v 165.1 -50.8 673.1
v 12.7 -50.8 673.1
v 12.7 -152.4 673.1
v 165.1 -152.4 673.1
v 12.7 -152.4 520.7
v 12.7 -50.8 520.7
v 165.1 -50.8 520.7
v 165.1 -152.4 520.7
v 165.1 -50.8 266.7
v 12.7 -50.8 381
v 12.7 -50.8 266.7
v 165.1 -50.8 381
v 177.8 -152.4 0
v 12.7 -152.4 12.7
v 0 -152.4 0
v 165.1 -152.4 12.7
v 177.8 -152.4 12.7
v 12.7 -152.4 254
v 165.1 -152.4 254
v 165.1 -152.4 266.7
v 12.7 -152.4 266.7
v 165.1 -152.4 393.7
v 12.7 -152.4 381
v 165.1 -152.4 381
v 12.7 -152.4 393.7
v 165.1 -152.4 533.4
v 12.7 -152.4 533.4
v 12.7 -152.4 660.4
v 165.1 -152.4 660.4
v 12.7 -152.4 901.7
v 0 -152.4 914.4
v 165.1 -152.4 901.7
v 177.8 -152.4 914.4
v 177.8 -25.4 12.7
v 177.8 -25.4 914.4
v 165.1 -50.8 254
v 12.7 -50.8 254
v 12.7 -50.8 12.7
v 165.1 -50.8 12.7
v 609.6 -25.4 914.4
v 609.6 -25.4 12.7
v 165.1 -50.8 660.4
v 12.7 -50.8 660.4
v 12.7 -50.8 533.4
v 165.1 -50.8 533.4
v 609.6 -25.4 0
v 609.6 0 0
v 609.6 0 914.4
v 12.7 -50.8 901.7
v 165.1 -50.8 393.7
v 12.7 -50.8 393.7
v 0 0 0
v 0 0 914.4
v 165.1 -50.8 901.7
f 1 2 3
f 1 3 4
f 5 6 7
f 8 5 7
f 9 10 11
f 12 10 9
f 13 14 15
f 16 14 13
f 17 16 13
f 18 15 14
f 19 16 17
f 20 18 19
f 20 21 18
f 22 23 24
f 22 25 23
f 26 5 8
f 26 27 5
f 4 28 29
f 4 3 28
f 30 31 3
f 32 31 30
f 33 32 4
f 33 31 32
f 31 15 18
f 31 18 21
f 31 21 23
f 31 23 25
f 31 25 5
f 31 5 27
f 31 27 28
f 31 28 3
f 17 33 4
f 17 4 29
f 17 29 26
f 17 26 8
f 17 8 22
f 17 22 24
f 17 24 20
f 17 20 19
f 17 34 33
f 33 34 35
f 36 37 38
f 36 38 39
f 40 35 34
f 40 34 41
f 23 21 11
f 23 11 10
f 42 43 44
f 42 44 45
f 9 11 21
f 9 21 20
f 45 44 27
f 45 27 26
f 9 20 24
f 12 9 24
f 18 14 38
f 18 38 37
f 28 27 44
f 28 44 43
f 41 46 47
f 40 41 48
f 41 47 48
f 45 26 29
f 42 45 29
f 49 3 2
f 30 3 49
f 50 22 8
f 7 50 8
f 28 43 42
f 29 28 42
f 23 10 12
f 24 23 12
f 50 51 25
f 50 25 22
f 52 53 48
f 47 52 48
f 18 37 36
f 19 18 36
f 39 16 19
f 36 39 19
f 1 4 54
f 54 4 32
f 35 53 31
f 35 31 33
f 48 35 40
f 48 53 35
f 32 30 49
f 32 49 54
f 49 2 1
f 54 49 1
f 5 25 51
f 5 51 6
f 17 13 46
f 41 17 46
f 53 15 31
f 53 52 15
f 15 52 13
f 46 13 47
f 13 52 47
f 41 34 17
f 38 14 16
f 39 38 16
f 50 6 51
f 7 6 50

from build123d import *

# Parameters (mm, degrees)
F0_W     = 609.6
F0_H     = 914.4
F1_DEPTH = 25.4
F2_W     = 177.8
F2_H     = 914.4
F3_DEPTH = 127
F4_W     = 152.4
F4_H     = 889
F5_DEPTH = 101.6
F6_W     = 152.4
F6_H     = 12.7
F7_DEPTH = 101.6
F9_DEPTH = 12.7


with BuildPart() as f1:
    # F0 (on Front) → F1 (new body)
    with BuildSketch(Plane.XZ):
        with Locations((304.8, 457.2)):
            Rectangle(F0_W, F0_H)
    extrude(amount=F1_DEPTH)

    # F2 (on face) → F3 (join)
    with BuildSketch(Plane.XZ.offset(25.4)):
        with Locations((88.9, 457.2)):
            Rectangle(F2_W, F2_H)
    extrude(amount=F3_DEPTH)

    # F4 (on face) → F5 (cut)
    with BuildSketch(Plane.XZ.offset(152.4)):
        with Locations((88.9, 457.2)):
            Rectangle(F4_W, F4_H)
    extrude(amount=-F5_DEPTH, mode=Mode.SUBTRACT)

    # F6 (on face) → F7 (join)
    with BuildSketch(Plane.XZ.offset(50.8)):
        with Locations((88.9, 666.75)):
            Rectangle(F6_W, F6_H)
        with Locations((88.9, 527.05)):
            Rectangle(F6_W, F6_H)
        with Locations((88.9, 387.35)):
            Rectangle(F6_W, F6_H)
        with Locations((88.9, 260.35)):
            Rectangle(F6_W, F6_H)
    extrude(amount=F7_DEPTH)

    # F8 (on Top) → F9 (join)
    with BuildSketch(Plane.XY):
        Polygon((177.8, -25.4), (177.8, -152.4), (609.6, -25.4), align=None)
    extrude(amount=F9_DEPTH)


solid = f1.part
